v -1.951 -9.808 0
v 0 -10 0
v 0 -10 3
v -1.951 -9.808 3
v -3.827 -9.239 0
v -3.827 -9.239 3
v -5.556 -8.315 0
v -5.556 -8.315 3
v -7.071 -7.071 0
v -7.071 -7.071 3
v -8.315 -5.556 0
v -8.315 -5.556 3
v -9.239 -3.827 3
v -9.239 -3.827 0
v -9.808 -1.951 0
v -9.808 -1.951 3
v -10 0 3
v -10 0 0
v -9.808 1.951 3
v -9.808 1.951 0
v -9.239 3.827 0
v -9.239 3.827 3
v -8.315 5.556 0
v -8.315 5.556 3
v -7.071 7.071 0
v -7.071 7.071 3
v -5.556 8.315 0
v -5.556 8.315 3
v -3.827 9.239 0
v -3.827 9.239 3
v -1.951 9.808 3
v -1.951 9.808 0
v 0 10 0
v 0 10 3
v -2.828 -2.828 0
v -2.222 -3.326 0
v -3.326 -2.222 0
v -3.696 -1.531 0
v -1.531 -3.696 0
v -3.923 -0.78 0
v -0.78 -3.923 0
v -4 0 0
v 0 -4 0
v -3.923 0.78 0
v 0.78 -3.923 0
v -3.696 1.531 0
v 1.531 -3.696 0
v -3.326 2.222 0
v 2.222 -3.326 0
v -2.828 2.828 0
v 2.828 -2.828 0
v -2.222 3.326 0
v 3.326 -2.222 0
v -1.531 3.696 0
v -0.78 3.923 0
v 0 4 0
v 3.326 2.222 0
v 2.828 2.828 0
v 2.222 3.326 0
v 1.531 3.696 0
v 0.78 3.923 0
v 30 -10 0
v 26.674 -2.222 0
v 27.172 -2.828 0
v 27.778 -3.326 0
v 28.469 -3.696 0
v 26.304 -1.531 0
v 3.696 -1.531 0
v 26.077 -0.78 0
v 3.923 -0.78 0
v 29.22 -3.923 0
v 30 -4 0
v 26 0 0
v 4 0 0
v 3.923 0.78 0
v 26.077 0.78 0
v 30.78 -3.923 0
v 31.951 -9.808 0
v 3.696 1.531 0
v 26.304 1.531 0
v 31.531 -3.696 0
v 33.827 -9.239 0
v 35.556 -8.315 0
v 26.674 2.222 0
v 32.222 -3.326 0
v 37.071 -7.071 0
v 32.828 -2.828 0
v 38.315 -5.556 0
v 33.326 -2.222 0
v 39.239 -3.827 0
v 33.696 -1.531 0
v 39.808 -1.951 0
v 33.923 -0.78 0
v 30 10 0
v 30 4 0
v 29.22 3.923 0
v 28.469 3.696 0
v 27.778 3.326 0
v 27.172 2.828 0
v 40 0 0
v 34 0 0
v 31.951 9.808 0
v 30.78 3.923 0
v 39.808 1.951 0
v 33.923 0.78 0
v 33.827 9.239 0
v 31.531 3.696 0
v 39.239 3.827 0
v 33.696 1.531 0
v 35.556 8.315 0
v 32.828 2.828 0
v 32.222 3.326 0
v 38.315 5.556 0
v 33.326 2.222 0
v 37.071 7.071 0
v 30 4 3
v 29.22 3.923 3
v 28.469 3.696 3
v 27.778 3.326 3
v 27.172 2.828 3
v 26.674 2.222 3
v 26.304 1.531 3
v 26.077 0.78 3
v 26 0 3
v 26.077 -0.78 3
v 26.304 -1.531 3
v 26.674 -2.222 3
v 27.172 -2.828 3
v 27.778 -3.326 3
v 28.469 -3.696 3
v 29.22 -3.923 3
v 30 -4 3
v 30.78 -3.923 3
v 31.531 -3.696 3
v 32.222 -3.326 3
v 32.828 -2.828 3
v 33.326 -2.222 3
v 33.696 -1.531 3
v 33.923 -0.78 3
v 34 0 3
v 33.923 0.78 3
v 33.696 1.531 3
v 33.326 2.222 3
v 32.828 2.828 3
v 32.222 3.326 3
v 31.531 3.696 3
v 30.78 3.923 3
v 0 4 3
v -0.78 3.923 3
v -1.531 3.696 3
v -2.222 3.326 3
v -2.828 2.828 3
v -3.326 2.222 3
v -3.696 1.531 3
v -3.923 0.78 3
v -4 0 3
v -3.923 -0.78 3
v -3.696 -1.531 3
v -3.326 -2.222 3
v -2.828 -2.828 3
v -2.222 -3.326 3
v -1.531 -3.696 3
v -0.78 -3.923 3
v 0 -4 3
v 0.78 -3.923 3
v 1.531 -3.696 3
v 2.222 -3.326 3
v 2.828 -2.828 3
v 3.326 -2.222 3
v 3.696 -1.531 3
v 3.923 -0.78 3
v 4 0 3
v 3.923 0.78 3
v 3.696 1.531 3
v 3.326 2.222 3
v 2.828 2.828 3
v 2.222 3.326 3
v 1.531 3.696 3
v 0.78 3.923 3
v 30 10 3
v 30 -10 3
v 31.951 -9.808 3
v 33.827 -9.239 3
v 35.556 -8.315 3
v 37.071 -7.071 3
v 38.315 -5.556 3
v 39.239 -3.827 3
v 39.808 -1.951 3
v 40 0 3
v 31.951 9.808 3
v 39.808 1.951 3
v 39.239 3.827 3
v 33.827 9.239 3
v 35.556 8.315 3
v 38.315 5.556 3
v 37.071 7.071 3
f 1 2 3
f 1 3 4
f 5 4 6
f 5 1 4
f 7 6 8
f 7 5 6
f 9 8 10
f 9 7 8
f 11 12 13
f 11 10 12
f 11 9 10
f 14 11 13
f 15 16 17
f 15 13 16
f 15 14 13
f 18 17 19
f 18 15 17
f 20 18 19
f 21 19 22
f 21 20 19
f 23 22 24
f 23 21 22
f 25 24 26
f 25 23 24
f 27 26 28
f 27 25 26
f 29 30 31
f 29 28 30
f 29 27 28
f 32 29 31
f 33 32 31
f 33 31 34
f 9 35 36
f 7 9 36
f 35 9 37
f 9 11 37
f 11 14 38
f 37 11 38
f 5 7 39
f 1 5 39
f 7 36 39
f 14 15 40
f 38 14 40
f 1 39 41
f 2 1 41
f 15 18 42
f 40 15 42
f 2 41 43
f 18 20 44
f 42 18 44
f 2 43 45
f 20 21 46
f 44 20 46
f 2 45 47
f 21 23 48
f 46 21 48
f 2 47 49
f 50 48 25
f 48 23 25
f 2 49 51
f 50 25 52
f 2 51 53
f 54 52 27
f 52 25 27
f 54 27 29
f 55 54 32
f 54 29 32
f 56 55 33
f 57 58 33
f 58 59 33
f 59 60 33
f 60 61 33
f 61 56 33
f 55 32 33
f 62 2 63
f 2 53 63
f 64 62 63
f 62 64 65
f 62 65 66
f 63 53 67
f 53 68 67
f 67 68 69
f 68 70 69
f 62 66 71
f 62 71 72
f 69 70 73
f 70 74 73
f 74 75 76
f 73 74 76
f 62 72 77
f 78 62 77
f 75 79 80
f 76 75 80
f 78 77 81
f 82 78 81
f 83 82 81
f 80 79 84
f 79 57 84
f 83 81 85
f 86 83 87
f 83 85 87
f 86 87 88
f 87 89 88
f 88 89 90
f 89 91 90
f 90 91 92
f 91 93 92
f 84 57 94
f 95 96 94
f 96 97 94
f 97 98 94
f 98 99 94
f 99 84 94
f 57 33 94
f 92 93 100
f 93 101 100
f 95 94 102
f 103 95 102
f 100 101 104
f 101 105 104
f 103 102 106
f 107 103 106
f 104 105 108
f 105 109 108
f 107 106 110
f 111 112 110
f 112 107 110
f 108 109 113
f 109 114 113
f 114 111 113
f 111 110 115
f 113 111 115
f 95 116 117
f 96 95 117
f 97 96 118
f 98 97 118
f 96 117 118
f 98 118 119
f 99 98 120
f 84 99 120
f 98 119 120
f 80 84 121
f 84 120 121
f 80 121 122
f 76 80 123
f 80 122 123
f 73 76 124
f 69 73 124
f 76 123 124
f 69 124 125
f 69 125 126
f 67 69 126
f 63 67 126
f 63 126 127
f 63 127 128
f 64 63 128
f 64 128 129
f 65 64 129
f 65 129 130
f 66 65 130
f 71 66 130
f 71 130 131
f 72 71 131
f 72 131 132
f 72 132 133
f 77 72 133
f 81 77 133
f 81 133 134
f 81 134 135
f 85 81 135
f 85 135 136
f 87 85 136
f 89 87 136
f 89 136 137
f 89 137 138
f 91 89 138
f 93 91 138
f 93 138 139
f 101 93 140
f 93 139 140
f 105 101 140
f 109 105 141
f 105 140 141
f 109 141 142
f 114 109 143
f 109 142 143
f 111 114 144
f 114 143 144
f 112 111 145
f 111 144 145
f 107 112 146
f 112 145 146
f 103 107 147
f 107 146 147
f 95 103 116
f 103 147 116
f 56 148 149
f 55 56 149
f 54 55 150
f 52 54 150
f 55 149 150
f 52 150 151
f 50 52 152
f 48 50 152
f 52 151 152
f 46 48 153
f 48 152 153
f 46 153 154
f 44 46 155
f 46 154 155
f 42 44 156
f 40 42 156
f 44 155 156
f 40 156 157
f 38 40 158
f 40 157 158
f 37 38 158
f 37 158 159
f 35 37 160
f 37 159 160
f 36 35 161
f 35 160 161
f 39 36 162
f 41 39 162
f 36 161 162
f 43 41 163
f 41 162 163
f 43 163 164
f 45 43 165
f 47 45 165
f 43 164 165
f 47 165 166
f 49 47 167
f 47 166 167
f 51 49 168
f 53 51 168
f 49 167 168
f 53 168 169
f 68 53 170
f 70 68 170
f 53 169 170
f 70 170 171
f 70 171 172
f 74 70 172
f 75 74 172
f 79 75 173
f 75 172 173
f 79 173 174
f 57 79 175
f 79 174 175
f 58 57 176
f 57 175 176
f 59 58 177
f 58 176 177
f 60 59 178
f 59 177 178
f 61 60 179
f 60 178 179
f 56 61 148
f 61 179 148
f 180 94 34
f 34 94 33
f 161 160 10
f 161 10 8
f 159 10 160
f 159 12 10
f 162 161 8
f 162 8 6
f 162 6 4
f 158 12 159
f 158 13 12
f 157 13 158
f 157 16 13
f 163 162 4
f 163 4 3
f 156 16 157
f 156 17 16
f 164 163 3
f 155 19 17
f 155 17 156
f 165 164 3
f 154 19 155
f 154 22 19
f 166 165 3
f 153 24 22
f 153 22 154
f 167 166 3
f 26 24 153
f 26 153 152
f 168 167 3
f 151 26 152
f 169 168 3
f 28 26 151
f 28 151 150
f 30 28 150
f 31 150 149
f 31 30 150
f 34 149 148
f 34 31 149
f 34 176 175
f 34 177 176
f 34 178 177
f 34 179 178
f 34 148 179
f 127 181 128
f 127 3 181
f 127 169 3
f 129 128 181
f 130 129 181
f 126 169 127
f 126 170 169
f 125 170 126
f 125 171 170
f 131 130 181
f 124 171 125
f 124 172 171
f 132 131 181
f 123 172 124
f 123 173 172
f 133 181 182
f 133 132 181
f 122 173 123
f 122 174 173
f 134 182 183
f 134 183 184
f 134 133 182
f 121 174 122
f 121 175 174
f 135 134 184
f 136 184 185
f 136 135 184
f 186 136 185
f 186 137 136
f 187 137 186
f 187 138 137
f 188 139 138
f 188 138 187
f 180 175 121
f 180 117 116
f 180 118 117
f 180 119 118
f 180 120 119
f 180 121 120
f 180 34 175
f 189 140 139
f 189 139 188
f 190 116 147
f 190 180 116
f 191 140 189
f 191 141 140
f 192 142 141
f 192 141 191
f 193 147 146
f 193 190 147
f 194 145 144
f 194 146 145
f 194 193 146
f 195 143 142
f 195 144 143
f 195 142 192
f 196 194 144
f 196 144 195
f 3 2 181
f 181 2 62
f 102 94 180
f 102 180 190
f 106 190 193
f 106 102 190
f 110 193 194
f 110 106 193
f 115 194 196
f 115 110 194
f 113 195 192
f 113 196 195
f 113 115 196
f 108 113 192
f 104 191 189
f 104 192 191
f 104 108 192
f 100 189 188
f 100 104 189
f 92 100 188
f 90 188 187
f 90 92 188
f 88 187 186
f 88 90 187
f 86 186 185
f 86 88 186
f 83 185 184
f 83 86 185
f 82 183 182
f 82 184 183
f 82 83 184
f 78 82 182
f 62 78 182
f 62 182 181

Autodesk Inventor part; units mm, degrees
ref_plane "YZ Plane" through (0, 0, 0) normal (1, 0, 0) x (0, 1, 0)
ref_plane "XZ Plane" through (0, 0, 0) normal (0, 1, 0) x (-1, 0, 0)
ref_plane "XY Plane" through (0, 0, 0) normal (0, 0, 1) x (1, 0, 0)
sketch "Szkic1" plane through (0, 0, 0) normal (0, 0, 1) x (1, 0, 0)
  line L0 (0, 0) -> (30, 0) construction
  line L1 (0, -10) -> (30, -10)
  line L2 (30, 10) -> (0, 10)
  arc A0 (0, 10) -> (0, -10) centre (0, 0) ccw
  arc A1 (30, -10) -> (30, 10) centre (30, 0) ccw
  point P0 (15, 0)
  dimension "d0" = 30
  dimension "d1" = 20
extrude "Wyciągnięcie proste1" add sketch "Szkic1" along normal blind 3
hole "Otwór1" at (0, 0, 0) at (30, 0, 0) direction (0, 0, 1) diameter 8 end through all
properties part number "ramie_2_wahacza_tylnego"
